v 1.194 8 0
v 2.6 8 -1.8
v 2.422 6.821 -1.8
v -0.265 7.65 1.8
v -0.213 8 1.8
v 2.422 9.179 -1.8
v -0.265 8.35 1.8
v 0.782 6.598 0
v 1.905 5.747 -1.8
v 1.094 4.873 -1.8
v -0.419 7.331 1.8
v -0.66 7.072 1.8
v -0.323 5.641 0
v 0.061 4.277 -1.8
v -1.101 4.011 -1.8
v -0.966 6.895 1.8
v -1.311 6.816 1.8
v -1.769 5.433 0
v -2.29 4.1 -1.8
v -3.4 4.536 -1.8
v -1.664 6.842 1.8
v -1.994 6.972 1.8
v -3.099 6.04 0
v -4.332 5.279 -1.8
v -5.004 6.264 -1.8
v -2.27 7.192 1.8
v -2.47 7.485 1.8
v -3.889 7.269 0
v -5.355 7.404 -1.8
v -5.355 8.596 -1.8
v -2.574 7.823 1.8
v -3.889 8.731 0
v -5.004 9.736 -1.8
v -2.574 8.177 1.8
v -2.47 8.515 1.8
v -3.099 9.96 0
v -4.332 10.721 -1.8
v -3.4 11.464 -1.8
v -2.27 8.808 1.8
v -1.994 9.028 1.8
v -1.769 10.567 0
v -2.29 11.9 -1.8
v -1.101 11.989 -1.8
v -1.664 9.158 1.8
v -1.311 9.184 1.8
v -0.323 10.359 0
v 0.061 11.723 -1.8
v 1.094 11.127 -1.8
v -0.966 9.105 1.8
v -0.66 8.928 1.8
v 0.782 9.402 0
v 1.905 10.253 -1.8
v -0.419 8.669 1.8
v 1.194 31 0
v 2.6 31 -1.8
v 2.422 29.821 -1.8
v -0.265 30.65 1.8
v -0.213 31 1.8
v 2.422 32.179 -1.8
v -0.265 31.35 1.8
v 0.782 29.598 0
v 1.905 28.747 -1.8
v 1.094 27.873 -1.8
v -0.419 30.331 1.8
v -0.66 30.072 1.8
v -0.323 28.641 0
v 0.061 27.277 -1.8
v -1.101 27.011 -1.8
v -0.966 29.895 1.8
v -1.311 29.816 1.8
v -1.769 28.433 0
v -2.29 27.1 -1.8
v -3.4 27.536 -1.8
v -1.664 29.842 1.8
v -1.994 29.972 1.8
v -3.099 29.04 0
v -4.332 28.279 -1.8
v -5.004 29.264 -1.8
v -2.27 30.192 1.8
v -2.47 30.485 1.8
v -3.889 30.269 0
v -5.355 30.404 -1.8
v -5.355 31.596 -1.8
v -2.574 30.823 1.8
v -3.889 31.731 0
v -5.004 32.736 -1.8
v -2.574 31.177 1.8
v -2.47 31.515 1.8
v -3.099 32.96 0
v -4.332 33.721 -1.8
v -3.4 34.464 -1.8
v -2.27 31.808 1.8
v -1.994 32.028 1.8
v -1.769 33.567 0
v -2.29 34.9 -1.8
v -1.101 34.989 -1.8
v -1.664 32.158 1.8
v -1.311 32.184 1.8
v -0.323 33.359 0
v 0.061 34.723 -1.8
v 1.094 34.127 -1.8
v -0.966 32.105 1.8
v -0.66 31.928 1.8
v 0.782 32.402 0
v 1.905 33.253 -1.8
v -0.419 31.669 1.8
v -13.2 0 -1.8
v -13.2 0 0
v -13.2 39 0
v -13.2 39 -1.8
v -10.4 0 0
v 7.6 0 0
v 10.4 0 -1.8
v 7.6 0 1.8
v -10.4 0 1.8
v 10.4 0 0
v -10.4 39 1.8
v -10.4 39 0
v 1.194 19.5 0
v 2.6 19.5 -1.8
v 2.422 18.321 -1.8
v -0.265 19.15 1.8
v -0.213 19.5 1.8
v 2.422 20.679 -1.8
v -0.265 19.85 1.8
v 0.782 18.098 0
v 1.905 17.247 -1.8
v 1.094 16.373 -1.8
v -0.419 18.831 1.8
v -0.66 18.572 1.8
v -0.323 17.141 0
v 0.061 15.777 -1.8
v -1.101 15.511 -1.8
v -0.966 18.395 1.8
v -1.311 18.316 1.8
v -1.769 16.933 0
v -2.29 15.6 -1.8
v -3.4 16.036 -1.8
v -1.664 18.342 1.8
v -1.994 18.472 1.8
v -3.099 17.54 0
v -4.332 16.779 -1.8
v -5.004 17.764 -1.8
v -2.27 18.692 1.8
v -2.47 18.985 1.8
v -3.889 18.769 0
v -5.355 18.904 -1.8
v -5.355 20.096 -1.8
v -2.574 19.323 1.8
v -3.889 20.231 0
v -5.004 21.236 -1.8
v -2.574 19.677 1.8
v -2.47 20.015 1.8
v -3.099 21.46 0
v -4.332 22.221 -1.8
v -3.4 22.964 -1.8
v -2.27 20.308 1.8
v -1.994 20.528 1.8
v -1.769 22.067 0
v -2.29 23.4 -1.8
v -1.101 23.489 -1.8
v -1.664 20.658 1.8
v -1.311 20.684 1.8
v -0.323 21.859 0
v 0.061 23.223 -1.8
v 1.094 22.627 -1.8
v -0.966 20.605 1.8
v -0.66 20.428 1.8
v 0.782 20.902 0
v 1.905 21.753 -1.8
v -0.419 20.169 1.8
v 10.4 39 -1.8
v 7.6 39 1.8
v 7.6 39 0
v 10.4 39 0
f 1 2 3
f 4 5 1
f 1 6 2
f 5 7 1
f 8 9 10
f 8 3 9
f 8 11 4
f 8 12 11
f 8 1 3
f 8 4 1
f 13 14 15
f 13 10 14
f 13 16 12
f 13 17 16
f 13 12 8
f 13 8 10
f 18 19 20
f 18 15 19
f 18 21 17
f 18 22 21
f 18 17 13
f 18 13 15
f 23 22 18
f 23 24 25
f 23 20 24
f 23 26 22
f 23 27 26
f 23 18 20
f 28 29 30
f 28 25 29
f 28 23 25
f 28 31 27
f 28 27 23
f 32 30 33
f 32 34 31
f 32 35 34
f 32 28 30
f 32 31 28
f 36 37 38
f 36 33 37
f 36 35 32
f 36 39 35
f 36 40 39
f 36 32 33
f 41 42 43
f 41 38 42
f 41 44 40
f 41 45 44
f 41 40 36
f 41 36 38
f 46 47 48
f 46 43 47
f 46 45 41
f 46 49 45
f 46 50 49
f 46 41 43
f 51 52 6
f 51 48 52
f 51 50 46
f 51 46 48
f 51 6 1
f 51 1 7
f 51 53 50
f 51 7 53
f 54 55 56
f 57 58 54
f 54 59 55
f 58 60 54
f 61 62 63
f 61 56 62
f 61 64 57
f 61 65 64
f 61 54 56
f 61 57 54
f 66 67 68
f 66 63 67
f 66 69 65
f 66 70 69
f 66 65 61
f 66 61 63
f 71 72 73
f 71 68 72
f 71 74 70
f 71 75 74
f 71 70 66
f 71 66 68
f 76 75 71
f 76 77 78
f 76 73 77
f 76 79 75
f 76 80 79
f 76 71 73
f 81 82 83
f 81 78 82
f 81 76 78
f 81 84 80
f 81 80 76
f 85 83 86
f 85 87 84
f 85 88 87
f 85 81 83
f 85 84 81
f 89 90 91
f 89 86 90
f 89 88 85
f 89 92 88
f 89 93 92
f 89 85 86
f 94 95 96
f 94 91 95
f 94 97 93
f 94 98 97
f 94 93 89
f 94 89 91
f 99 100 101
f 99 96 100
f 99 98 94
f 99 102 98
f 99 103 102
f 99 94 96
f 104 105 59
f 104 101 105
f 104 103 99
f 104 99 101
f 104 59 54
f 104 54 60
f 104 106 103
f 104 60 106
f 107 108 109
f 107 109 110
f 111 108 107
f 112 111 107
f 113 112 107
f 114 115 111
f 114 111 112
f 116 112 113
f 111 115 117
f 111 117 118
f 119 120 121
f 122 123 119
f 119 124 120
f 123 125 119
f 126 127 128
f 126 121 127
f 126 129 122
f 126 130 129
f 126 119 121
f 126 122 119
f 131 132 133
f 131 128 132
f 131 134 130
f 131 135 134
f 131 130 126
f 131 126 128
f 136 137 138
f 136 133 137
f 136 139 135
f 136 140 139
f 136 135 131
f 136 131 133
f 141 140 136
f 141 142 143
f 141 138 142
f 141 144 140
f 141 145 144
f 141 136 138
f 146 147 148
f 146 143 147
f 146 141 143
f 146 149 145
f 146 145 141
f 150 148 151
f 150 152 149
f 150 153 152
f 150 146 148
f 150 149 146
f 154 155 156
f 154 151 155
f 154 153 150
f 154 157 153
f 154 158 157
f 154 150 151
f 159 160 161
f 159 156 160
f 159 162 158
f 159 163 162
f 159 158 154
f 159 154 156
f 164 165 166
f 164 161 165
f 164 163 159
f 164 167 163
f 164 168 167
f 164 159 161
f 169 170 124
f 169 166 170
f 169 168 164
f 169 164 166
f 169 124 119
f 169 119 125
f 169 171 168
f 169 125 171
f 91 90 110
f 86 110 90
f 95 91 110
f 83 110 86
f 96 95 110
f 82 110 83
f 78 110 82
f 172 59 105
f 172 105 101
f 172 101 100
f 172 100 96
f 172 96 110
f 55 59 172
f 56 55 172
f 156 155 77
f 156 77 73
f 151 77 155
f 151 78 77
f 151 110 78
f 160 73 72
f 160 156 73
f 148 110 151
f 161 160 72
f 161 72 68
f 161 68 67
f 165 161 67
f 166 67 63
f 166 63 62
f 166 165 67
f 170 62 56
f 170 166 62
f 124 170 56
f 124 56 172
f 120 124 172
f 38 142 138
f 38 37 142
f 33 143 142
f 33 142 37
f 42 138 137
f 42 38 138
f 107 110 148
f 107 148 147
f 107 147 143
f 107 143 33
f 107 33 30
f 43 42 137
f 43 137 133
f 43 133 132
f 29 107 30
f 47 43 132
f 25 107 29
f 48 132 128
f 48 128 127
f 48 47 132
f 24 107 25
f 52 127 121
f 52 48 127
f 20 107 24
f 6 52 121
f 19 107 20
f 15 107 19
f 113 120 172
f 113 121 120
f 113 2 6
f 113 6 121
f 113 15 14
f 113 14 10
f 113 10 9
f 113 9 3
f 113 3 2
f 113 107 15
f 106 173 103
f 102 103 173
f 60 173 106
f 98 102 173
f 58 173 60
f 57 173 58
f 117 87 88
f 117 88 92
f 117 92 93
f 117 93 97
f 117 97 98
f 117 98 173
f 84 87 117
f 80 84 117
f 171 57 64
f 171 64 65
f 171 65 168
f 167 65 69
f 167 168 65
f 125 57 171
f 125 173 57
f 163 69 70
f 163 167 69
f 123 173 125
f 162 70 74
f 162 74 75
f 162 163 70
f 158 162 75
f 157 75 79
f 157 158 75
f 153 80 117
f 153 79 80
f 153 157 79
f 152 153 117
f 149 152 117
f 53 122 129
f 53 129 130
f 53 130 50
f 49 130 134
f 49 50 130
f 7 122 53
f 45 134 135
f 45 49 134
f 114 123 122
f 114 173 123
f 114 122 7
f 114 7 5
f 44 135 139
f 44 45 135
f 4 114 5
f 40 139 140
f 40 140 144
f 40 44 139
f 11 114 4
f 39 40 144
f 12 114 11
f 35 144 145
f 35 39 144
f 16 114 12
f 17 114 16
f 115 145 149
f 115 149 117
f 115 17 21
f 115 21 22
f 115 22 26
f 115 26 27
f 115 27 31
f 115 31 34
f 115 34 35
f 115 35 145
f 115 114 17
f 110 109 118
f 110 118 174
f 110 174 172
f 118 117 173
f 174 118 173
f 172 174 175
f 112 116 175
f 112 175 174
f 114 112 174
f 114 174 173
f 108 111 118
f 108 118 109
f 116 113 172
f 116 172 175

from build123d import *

# Parameters (mm, degrees)
F1_DEPTH = 39
F2_R     = 4
F3_DEPTH = 3.6
F3_TAPER = 38


with BuildPart() as f1:
    # F0 (on Front) → F1 (new body)
    with BuildSketch(Plane.XZ):
        Polygon((7.6, 1.8), (-10.4, 1.8), (-10.4, 0), (-13.2, 0), (-13.2, -1.8), (10.4, -1.8), (10.4, 0), (7.6, 0), align=None)
    extrude(amount=-F1_DEPTH)

    # F2 (on face) → F3 (cut, through all)
    with BuildSketch(Plane(origin=(0, 0, -1.8), x_dir=(1, 0, 0), z_dir=(0, 0, -1))):
        with Locations((-1.4, -31)):
            Circle(F2_R)
        with Locations((-1.4, -19.5)):
            Circle(F2_R)
        with Locations((-1.4, -8)):
            Circle(F2_R)
    extrude(amount=-F3_DEPTH, taper=F3_TAPER, mode=Mode.SUBTRACT)


solid = f1.part
